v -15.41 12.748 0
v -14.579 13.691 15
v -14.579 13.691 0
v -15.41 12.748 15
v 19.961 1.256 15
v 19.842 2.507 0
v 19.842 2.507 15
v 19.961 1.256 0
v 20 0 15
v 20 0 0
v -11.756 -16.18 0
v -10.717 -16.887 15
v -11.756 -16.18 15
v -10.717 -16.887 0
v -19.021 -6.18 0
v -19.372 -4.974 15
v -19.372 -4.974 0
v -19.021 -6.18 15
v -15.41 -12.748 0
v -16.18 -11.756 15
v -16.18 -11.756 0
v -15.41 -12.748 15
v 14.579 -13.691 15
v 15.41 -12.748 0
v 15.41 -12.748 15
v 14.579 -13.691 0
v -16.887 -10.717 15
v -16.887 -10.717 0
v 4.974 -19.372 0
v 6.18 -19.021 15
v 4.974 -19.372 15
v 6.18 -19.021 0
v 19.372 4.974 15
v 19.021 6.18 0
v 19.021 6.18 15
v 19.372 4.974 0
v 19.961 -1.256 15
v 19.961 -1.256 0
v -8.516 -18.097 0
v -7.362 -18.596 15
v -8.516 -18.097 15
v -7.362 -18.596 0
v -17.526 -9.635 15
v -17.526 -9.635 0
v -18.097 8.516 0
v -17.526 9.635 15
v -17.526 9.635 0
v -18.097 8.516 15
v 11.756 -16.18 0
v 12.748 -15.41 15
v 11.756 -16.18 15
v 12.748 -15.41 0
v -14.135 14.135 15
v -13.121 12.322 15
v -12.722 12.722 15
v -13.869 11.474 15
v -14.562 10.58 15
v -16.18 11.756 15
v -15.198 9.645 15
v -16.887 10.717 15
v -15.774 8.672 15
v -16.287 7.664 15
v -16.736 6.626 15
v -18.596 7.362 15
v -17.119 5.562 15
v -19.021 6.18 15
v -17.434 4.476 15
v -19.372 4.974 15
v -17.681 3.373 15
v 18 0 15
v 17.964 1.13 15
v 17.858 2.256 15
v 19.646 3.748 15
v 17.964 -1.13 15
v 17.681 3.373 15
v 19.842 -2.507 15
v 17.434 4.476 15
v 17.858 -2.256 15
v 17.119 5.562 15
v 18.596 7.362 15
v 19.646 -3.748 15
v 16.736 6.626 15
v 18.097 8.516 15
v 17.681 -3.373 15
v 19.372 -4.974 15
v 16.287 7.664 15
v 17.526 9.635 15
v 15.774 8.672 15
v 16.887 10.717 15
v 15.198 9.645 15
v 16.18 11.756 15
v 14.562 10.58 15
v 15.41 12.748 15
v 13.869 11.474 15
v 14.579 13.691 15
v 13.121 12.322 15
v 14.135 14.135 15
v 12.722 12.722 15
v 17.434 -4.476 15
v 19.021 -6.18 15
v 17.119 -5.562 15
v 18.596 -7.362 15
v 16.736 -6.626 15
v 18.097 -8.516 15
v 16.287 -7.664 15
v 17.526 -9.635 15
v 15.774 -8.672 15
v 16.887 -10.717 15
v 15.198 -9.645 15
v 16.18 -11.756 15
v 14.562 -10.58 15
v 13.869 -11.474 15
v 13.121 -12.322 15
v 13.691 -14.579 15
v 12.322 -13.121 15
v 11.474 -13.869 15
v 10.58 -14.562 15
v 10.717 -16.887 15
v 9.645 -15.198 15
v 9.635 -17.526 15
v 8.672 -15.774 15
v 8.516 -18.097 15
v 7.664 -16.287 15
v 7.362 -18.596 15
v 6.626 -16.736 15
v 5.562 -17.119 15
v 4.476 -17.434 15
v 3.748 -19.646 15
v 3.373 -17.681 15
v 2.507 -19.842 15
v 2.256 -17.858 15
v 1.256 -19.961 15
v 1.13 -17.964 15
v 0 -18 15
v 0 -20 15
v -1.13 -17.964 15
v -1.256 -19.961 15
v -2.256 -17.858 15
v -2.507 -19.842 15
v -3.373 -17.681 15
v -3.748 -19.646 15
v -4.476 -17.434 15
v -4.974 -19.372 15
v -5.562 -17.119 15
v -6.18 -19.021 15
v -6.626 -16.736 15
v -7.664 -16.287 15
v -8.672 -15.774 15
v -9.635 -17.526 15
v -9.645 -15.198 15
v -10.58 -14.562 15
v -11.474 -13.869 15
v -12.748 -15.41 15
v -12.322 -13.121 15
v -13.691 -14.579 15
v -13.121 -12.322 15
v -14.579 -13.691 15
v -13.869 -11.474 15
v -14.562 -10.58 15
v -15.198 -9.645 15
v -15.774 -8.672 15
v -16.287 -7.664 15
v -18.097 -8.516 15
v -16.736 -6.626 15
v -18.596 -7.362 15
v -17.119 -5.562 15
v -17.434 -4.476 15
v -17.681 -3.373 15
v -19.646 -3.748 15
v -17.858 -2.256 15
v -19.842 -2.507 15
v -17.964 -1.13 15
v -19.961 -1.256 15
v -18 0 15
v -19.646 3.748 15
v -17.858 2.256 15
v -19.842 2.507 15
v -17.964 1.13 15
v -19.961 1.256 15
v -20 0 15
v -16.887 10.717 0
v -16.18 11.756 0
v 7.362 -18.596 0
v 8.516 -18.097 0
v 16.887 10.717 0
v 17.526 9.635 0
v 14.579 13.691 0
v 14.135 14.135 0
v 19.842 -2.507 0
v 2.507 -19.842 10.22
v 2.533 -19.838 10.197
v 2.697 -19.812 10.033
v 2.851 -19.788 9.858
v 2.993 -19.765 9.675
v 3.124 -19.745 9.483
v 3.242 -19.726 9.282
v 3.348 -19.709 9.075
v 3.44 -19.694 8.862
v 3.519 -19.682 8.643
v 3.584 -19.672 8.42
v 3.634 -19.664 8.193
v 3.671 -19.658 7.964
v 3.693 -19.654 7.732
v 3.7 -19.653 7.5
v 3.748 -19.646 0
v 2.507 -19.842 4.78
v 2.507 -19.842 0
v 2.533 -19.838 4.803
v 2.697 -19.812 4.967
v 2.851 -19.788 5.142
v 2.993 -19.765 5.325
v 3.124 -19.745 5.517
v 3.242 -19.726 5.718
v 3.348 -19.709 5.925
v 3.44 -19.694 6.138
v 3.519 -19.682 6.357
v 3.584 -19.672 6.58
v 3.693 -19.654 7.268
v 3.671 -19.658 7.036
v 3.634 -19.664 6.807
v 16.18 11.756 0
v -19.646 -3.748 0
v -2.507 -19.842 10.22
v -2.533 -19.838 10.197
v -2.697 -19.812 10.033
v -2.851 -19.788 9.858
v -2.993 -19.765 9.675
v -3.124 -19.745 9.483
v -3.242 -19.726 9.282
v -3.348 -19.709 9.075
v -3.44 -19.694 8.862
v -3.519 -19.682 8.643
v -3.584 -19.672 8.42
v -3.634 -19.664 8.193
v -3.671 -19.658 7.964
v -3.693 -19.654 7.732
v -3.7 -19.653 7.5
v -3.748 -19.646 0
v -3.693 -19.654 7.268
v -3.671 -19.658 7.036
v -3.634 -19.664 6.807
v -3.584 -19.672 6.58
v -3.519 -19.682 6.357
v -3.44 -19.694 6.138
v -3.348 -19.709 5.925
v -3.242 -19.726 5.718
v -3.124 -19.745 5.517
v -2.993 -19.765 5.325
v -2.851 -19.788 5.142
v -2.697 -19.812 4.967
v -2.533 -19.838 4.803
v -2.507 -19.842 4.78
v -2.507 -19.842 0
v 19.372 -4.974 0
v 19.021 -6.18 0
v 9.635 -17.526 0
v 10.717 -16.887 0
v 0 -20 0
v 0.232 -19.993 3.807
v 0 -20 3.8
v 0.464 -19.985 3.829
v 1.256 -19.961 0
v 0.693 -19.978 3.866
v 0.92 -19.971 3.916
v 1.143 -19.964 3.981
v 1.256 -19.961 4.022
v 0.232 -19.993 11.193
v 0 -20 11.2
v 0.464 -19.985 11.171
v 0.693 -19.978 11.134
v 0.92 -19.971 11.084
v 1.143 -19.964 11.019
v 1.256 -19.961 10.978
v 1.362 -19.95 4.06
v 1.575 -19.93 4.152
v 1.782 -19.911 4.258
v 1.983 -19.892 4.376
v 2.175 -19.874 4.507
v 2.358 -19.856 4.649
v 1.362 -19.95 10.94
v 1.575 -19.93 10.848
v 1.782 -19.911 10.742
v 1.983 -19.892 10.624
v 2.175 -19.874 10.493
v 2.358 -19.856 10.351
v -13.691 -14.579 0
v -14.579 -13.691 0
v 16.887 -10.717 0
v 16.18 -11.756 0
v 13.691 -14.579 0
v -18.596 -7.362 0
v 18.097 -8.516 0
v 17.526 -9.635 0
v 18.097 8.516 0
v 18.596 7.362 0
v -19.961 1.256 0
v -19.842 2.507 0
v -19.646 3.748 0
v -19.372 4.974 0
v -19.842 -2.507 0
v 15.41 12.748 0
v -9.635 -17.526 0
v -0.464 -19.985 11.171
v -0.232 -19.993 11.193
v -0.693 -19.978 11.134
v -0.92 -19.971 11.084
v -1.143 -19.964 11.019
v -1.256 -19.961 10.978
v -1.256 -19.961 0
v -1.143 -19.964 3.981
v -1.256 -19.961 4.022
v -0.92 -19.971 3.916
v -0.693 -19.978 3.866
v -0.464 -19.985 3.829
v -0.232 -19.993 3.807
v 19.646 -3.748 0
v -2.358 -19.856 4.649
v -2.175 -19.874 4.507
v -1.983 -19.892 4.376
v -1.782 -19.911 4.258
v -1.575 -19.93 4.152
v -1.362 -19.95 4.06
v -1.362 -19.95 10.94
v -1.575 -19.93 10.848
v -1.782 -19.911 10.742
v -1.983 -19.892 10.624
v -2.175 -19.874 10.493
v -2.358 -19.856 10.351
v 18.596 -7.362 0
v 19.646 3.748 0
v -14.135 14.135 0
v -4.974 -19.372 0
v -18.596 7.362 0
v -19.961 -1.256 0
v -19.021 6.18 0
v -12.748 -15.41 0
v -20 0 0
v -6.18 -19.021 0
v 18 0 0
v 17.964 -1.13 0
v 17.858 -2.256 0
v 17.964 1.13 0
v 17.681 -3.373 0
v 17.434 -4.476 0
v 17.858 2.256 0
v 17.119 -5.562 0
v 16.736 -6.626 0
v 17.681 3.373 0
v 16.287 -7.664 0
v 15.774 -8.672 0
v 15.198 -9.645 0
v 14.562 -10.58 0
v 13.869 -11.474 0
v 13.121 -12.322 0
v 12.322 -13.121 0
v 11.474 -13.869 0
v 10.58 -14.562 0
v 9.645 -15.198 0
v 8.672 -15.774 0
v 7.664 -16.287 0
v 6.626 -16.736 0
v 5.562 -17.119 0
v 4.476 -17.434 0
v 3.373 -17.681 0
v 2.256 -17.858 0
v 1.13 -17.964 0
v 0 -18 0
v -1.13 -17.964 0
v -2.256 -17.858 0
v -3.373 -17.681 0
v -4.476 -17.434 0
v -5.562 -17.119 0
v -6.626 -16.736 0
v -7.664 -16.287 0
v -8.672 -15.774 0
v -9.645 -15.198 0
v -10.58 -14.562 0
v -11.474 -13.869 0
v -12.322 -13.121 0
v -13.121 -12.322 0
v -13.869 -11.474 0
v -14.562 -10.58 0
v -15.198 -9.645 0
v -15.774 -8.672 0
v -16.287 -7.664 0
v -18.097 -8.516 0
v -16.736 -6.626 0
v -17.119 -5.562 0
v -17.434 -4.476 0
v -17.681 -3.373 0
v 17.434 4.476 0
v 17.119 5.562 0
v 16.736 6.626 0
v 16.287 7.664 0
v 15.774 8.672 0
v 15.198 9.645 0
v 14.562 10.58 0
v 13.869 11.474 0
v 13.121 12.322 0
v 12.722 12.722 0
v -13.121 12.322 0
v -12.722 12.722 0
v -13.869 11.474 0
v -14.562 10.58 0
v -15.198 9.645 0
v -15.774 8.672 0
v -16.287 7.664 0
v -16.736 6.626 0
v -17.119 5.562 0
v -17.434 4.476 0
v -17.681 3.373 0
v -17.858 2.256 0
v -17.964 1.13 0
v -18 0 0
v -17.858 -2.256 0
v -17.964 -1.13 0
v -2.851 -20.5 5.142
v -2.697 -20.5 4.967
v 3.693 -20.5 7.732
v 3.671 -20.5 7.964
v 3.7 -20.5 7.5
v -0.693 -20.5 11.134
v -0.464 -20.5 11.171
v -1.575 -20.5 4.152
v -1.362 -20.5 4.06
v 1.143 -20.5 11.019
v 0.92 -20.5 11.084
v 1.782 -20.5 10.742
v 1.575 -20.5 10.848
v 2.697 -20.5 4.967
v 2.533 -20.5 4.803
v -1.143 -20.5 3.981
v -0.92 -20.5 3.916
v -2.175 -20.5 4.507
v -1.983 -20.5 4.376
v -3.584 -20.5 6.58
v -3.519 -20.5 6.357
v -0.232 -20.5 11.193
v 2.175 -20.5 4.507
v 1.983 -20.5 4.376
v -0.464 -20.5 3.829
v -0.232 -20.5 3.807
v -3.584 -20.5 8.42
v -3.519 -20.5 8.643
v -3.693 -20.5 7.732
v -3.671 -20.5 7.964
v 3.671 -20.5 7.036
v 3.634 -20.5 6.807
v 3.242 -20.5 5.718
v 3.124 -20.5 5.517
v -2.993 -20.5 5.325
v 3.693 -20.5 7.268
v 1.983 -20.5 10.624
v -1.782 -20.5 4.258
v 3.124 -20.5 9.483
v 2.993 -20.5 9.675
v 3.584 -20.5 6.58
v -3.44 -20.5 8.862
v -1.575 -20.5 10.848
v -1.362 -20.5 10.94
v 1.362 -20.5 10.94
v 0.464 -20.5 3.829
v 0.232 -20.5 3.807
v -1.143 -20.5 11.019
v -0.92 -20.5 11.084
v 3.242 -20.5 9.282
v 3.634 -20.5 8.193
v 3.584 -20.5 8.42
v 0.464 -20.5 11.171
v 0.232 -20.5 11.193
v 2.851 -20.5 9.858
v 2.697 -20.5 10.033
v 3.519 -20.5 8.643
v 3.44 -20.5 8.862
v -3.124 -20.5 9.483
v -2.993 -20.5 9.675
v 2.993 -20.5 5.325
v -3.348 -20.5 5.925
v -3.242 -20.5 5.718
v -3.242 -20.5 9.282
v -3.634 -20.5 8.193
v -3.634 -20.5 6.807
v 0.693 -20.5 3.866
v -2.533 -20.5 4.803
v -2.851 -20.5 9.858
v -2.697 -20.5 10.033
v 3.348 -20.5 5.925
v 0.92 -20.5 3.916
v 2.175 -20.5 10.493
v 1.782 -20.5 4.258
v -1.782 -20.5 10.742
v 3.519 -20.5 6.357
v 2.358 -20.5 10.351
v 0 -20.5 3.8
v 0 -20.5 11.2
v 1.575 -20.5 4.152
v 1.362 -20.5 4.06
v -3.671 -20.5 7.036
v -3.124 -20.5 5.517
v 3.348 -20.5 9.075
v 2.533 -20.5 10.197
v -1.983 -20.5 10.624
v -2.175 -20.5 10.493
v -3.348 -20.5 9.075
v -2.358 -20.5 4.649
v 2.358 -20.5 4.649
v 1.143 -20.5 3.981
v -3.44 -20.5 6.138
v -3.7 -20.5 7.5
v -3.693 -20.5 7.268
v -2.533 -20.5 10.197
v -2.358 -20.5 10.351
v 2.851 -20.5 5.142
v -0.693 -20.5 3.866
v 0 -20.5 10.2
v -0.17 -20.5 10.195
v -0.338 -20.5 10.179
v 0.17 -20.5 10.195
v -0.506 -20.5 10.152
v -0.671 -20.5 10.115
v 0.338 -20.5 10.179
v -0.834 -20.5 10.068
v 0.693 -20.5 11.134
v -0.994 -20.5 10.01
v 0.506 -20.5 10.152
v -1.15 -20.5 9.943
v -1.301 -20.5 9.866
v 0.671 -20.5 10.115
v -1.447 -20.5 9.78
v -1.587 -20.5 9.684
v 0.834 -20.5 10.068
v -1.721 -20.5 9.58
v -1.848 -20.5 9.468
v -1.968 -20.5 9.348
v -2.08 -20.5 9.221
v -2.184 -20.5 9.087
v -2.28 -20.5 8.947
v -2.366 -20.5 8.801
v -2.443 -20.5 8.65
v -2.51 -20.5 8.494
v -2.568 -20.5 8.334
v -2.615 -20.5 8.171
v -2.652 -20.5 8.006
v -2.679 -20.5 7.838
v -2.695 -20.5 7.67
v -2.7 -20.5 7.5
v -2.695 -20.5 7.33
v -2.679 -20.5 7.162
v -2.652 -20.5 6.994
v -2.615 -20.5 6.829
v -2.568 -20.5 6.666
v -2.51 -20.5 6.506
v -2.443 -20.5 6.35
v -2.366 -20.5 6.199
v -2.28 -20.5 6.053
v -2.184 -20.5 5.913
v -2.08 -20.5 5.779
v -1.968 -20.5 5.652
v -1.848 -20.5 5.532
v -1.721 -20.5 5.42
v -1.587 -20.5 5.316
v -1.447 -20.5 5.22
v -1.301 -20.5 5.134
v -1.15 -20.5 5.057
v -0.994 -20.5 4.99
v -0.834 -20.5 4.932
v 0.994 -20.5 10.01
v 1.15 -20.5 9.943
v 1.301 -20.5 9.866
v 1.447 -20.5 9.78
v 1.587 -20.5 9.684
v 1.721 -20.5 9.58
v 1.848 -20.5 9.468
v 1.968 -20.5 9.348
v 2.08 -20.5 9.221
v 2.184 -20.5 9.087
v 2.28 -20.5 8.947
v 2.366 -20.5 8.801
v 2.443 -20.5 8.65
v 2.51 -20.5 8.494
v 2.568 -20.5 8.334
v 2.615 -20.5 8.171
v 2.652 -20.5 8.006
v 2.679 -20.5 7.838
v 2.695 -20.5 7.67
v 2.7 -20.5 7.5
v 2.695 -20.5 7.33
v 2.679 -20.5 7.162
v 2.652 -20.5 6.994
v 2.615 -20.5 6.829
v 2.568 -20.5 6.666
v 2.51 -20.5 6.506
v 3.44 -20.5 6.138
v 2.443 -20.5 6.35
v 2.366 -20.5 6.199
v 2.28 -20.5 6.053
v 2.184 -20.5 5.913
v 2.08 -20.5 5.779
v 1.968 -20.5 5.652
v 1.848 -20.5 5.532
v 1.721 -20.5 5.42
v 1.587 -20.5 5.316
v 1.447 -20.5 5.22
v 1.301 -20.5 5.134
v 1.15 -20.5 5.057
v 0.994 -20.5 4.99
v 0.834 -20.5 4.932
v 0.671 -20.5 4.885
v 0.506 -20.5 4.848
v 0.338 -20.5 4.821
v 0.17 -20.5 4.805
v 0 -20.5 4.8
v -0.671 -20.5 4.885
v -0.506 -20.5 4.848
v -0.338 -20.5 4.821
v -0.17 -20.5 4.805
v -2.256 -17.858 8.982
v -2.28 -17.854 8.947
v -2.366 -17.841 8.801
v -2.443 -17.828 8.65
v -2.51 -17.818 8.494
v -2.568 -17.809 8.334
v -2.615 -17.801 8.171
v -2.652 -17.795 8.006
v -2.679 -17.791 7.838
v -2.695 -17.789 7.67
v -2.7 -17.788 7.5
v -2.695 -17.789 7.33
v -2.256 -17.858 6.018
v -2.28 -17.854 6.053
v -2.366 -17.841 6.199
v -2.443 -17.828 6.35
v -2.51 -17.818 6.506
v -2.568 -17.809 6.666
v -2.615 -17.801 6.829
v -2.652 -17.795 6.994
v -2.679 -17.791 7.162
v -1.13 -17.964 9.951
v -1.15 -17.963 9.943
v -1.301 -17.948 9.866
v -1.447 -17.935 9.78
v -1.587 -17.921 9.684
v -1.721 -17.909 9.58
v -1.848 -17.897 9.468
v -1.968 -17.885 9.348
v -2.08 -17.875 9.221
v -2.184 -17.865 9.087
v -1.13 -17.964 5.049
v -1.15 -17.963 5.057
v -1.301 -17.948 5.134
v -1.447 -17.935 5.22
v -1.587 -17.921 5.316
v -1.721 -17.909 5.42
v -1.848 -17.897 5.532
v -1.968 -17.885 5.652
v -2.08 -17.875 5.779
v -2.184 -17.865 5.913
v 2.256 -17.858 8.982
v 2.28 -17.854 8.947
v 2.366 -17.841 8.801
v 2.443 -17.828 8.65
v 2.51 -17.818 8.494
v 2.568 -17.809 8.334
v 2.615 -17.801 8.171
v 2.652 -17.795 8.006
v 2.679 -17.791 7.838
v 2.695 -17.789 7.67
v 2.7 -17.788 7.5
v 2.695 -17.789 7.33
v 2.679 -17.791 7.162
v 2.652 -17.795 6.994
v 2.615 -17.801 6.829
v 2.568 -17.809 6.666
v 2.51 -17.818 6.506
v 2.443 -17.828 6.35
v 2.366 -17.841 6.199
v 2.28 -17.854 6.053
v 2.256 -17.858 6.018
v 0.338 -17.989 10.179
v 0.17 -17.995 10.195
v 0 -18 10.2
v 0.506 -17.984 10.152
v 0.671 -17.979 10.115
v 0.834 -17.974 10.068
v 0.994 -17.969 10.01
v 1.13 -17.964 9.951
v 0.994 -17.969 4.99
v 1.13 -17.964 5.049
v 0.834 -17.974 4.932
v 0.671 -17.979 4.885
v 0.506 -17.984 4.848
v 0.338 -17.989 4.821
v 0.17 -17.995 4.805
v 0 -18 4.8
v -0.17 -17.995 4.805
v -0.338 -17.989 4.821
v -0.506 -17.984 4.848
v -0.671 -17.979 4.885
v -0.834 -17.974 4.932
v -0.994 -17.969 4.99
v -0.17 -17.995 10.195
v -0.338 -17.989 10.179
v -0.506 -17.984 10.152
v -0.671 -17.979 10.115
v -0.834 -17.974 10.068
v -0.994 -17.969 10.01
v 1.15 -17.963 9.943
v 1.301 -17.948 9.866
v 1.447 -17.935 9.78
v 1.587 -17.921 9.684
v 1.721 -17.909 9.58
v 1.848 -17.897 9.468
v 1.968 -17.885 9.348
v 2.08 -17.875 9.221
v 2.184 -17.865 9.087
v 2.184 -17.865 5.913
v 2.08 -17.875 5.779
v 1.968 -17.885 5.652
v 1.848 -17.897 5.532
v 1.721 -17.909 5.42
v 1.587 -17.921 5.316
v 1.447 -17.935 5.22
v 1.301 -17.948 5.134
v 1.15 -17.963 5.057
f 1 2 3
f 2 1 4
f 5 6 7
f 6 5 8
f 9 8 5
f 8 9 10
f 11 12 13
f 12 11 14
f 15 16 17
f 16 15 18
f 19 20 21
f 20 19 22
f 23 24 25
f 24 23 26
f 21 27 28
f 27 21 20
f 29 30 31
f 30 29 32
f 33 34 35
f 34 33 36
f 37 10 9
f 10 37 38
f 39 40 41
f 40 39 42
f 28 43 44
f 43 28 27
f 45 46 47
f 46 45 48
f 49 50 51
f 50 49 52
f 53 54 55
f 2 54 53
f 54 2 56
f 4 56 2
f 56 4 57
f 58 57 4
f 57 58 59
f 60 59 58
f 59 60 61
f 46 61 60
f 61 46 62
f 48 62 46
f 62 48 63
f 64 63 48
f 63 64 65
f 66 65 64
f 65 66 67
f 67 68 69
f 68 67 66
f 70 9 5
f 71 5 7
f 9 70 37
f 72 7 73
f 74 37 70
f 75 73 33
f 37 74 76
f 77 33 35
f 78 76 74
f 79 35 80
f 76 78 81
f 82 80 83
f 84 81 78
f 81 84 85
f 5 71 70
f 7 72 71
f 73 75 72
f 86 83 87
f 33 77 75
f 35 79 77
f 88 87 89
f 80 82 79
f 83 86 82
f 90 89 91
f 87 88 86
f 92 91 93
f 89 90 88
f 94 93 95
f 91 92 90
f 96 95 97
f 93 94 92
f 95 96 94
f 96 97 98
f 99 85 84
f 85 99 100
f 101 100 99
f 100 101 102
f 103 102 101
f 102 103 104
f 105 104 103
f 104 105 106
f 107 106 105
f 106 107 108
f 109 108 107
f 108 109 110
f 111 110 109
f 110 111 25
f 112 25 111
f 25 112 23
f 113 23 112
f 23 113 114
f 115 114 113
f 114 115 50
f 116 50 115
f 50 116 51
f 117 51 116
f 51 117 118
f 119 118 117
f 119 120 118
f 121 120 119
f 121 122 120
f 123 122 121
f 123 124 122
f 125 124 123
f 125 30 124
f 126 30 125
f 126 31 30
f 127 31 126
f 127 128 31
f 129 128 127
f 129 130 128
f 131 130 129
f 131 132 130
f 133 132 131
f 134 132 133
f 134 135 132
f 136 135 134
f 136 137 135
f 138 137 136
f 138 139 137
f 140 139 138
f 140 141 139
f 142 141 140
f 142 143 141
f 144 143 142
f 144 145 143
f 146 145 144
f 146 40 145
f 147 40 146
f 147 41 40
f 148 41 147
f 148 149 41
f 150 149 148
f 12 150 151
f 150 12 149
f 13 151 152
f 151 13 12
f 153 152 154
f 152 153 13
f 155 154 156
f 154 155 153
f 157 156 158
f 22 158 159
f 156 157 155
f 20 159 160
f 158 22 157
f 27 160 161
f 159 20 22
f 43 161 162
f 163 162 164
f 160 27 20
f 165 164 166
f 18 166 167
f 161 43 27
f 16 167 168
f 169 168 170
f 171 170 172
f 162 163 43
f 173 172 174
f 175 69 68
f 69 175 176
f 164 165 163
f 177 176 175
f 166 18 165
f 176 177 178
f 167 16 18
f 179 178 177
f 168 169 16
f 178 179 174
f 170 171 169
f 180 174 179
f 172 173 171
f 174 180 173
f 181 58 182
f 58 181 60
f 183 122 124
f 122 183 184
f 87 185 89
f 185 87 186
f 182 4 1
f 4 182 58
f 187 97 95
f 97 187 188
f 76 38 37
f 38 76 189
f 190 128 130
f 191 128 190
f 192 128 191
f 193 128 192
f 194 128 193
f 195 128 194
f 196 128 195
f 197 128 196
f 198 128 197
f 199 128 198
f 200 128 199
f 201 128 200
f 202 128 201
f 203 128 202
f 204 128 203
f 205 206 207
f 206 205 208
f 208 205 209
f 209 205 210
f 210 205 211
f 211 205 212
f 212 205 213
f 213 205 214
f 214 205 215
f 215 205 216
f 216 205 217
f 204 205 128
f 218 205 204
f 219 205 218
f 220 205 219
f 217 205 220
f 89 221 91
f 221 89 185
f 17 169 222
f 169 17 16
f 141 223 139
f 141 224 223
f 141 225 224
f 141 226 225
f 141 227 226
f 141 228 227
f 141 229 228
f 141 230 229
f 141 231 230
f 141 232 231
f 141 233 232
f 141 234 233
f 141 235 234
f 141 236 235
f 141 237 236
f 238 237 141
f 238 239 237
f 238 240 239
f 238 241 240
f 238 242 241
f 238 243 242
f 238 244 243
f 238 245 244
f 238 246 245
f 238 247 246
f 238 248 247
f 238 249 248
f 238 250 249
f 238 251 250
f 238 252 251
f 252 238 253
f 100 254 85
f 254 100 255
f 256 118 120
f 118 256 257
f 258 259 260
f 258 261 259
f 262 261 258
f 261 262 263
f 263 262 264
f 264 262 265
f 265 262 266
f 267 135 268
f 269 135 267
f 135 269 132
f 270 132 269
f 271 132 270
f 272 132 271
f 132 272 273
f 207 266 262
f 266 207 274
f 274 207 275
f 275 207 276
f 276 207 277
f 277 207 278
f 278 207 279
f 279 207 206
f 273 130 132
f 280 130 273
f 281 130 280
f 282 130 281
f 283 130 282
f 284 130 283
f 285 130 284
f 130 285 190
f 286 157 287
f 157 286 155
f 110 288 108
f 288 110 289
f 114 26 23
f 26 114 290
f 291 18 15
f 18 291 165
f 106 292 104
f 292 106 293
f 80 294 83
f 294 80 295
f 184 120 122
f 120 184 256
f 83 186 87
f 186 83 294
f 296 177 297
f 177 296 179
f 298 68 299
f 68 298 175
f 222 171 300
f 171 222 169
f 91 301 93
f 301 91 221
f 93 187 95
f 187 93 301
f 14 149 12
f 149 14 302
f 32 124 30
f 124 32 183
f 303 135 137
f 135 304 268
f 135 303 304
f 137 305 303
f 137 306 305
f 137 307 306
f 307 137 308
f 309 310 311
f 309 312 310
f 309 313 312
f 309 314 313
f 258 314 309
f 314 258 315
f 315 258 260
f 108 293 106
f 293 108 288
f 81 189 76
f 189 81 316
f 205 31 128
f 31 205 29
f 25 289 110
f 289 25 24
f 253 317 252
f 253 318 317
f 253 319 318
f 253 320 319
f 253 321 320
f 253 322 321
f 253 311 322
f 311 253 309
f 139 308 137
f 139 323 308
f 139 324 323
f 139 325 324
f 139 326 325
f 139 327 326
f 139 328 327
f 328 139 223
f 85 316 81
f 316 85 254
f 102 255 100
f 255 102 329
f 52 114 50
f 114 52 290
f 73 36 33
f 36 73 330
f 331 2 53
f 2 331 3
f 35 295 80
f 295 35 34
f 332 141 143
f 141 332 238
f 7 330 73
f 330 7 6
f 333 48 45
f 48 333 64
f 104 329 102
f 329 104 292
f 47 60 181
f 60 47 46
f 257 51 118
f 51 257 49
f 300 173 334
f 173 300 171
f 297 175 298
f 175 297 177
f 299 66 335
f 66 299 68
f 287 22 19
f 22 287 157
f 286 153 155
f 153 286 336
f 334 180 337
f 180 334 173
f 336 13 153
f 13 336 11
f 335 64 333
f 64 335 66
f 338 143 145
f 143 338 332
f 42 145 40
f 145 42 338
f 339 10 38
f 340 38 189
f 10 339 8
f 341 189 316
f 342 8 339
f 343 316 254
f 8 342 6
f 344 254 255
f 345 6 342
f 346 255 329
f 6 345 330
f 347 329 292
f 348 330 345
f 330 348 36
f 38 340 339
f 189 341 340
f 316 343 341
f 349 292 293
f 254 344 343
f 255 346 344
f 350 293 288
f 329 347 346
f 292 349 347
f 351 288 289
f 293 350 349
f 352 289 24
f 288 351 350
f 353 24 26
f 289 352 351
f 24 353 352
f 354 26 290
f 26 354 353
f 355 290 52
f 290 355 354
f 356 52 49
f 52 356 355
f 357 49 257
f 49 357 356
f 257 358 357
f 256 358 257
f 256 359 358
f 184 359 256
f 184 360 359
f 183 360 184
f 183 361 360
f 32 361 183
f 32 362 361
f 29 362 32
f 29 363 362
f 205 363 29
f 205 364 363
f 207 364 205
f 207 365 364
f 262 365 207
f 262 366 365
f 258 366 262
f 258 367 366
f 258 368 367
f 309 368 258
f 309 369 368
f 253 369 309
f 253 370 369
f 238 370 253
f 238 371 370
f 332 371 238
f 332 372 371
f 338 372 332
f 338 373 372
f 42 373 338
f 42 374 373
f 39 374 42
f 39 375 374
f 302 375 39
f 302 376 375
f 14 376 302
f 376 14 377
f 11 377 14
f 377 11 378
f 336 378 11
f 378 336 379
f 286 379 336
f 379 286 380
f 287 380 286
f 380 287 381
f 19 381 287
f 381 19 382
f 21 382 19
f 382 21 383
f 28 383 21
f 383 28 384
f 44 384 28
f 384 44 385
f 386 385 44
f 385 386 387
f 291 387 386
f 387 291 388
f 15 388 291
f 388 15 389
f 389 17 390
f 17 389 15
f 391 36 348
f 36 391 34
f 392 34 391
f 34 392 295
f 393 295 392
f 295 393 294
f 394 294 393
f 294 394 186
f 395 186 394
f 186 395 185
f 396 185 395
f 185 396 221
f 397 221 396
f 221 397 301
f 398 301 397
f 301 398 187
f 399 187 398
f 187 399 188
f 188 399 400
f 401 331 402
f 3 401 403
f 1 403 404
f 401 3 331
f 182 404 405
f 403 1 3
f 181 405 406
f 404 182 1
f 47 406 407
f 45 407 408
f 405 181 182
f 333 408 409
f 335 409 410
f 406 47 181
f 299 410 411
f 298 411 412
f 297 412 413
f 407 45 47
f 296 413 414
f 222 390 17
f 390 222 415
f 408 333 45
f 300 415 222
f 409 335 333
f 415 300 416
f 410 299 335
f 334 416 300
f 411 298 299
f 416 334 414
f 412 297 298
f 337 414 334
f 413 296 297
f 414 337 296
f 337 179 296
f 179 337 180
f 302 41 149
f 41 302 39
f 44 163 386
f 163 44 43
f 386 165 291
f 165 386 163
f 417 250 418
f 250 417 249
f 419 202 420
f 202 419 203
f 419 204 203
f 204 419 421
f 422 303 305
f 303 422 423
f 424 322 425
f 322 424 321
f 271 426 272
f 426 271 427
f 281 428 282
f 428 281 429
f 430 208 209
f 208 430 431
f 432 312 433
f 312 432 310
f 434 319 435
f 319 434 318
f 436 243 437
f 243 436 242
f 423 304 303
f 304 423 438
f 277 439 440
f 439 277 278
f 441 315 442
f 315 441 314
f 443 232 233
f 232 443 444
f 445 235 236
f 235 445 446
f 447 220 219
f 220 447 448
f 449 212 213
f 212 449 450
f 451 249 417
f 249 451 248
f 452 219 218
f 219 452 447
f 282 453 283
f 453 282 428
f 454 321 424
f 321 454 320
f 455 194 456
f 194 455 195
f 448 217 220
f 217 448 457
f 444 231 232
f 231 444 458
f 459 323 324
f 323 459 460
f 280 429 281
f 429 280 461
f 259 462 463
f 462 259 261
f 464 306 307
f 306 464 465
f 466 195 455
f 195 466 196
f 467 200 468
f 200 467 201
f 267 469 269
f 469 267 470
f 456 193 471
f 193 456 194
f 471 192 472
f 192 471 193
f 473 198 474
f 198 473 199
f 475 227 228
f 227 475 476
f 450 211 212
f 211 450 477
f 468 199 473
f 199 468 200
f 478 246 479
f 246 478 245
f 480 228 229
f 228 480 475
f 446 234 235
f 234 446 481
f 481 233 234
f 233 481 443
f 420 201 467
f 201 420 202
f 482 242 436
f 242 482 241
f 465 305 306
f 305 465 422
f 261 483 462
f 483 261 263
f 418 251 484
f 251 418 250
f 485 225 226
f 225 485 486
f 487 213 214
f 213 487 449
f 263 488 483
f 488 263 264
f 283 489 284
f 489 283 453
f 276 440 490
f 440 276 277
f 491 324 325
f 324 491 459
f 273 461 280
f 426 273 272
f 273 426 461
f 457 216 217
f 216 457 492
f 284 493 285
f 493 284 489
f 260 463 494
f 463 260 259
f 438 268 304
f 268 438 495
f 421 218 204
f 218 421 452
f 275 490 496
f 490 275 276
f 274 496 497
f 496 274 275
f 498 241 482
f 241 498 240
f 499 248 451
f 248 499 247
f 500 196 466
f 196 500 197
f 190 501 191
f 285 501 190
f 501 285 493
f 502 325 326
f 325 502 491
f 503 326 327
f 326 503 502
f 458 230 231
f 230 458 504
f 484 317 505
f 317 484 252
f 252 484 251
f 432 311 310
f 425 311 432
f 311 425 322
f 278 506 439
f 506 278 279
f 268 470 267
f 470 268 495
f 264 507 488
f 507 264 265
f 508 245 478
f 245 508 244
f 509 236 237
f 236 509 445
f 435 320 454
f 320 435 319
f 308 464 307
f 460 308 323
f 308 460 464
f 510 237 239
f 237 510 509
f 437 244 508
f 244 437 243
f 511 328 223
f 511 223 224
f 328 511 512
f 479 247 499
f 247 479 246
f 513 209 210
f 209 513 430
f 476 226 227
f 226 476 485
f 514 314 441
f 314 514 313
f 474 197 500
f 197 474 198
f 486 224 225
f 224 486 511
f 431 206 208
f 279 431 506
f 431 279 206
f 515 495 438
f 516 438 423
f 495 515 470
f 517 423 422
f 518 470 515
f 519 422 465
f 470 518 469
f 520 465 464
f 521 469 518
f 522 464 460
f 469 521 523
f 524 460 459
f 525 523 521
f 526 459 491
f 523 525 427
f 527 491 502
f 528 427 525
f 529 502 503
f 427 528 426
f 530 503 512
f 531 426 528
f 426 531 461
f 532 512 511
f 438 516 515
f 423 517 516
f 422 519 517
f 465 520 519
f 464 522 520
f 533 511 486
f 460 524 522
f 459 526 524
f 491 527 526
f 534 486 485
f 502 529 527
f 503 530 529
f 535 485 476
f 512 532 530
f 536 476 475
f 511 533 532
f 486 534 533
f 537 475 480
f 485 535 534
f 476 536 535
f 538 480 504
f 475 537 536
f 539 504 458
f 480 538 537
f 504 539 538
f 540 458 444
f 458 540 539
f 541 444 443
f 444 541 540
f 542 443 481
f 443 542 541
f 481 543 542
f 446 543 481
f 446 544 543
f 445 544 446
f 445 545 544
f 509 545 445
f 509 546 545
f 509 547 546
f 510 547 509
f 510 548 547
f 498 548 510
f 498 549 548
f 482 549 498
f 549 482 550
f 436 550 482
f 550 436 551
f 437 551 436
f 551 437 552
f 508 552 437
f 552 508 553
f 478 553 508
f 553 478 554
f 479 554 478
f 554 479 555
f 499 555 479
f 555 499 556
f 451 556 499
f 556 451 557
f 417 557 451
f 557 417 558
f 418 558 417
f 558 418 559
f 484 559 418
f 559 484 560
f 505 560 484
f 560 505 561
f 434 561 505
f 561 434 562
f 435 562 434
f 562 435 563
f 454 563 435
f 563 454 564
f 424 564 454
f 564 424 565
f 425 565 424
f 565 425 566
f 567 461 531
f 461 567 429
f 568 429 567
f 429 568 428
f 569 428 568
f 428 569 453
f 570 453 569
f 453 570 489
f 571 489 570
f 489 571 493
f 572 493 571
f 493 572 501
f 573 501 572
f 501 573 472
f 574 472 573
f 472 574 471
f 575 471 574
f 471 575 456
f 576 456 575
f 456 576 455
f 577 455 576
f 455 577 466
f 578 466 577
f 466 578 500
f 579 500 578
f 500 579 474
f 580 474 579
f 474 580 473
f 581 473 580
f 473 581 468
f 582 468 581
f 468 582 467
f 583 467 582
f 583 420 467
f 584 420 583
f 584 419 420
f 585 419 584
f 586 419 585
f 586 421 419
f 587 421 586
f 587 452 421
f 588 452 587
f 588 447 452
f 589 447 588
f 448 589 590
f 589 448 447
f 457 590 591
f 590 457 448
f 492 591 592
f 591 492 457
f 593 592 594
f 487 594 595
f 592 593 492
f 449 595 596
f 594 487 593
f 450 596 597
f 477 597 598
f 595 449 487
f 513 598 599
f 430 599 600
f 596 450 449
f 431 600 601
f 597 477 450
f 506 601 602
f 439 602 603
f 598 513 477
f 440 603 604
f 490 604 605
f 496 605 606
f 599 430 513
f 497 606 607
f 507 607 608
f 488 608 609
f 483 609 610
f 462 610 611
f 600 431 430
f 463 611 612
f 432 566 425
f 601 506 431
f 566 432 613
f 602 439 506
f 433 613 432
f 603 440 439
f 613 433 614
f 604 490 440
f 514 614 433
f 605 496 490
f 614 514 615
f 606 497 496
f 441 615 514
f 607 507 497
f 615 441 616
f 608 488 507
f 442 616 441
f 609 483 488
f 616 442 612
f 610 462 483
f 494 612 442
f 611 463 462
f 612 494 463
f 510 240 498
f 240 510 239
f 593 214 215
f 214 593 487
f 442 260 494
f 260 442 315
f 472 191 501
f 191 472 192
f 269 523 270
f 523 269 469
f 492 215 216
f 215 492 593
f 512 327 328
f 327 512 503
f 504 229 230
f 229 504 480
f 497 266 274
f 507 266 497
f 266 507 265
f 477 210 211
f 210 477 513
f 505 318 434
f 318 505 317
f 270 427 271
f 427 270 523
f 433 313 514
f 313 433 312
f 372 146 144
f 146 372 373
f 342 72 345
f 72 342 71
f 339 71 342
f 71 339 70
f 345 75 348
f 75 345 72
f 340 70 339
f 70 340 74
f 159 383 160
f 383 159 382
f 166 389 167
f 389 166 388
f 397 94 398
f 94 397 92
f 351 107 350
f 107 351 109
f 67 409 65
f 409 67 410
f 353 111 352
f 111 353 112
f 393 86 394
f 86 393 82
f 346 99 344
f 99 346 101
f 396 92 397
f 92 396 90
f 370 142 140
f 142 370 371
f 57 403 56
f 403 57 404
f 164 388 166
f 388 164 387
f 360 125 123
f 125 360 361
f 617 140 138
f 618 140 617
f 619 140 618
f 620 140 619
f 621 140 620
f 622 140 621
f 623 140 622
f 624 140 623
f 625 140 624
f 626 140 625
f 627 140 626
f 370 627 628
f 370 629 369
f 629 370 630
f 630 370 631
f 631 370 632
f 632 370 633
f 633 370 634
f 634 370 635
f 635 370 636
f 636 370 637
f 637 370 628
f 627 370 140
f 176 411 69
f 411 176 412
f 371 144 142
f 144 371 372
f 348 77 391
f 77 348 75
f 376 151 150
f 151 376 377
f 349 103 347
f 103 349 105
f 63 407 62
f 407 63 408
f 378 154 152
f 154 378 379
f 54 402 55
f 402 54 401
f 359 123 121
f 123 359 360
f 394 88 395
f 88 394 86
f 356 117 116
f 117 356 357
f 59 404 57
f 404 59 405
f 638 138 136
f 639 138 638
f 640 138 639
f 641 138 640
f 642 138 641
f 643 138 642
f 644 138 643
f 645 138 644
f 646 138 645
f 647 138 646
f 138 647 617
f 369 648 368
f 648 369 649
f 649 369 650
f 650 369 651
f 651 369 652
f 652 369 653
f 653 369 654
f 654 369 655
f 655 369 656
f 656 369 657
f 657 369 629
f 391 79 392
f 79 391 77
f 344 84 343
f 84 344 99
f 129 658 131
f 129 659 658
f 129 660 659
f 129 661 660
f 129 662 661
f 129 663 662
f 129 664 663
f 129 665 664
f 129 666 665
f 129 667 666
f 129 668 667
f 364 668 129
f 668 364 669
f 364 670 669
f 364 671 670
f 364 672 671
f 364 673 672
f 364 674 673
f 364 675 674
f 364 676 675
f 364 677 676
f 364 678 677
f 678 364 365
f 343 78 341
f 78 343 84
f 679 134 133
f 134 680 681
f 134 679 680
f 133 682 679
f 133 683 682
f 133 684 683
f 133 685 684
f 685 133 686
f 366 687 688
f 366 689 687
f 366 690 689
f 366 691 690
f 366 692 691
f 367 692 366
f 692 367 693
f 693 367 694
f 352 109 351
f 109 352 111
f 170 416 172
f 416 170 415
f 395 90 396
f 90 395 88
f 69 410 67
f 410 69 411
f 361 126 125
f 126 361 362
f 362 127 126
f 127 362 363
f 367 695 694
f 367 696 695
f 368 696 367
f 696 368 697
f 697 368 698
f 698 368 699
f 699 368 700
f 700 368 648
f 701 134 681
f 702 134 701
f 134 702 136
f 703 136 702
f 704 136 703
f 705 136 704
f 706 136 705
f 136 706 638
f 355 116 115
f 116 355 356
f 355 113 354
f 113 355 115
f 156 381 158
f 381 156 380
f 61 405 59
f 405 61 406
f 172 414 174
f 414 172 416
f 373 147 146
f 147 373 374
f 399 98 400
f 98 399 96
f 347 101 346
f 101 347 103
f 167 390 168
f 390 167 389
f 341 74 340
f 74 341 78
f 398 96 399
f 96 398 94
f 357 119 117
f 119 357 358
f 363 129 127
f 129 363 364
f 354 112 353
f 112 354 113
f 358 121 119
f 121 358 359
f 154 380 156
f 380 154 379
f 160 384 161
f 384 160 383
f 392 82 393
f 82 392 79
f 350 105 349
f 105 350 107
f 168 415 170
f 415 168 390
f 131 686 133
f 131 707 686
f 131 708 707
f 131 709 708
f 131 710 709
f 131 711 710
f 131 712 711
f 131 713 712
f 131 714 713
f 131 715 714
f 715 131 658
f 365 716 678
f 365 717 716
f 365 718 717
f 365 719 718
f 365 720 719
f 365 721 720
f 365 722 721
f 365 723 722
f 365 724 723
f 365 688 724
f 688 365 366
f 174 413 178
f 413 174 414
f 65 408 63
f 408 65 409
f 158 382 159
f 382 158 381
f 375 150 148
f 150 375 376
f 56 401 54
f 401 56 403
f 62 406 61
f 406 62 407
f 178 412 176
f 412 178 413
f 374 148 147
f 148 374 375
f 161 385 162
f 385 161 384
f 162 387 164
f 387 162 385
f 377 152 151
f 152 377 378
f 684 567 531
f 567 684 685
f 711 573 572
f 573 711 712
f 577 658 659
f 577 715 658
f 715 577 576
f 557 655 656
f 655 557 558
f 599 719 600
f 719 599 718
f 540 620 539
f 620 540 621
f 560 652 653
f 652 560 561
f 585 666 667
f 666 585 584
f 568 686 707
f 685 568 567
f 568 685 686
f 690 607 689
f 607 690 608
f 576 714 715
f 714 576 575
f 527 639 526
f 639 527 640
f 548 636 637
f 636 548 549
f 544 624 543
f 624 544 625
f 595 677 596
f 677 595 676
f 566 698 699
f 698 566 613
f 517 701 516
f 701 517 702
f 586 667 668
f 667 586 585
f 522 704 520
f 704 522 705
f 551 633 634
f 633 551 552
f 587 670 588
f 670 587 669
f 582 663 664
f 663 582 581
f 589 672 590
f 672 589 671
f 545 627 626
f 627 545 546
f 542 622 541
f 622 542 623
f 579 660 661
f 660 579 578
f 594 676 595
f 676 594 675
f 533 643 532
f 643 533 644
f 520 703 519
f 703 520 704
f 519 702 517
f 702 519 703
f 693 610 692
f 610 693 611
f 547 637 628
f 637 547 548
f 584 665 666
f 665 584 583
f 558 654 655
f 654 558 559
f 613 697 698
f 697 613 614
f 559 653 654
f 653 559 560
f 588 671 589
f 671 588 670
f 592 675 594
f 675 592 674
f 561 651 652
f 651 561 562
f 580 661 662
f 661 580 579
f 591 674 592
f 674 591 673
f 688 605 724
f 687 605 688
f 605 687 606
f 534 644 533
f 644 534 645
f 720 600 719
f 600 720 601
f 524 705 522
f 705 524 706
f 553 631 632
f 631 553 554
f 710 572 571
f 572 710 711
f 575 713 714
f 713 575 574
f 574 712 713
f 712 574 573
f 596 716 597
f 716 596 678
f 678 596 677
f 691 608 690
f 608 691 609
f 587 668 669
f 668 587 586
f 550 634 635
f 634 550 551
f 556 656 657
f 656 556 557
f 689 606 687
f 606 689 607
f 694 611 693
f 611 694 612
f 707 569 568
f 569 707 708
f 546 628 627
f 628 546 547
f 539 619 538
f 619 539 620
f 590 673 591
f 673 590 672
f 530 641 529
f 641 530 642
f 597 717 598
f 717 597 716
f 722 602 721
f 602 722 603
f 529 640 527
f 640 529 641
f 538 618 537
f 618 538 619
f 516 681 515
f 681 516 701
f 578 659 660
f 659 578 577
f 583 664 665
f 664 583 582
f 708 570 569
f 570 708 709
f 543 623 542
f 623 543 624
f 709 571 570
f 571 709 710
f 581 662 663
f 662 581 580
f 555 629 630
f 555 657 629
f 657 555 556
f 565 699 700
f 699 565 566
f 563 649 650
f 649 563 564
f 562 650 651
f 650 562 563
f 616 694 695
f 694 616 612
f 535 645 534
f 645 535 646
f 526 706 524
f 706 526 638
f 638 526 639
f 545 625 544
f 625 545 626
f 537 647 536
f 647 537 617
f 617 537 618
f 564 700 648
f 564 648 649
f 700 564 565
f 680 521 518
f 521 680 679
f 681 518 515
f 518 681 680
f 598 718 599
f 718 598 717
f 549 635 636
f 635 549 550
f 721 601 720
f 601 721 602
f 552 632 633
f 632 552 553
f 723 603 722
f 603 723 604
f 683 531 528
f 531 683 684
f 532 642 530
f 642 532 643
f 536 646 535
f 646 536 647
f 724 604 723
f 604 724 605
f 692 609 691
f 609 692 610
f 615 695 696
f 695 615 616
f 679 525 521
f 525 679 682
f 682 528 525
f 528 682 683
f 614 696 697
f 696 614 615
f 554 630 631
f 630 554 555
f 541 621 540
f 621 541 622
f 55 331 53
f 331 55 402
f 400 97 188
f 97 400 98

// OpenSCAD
$fn = 100;


d = 36; // vnitrni
wall = 2;
h = 15;

dl = 5.4; // d LEDky

difference(){
    union(){
        cylinder(d=d+2*wall, h=h);
        translate([0,0, h/2]) rotate([90,0,0]) cylinder(d=dl+2, h=d/2+wall+0.5);
    }
    cylinder(d=d, h=h);
    translate([0,0, h/2]) rotate([90,0,0]) cylinder(d=dl, h=100);
    rotate([0,0,45]) cube(50);
}
